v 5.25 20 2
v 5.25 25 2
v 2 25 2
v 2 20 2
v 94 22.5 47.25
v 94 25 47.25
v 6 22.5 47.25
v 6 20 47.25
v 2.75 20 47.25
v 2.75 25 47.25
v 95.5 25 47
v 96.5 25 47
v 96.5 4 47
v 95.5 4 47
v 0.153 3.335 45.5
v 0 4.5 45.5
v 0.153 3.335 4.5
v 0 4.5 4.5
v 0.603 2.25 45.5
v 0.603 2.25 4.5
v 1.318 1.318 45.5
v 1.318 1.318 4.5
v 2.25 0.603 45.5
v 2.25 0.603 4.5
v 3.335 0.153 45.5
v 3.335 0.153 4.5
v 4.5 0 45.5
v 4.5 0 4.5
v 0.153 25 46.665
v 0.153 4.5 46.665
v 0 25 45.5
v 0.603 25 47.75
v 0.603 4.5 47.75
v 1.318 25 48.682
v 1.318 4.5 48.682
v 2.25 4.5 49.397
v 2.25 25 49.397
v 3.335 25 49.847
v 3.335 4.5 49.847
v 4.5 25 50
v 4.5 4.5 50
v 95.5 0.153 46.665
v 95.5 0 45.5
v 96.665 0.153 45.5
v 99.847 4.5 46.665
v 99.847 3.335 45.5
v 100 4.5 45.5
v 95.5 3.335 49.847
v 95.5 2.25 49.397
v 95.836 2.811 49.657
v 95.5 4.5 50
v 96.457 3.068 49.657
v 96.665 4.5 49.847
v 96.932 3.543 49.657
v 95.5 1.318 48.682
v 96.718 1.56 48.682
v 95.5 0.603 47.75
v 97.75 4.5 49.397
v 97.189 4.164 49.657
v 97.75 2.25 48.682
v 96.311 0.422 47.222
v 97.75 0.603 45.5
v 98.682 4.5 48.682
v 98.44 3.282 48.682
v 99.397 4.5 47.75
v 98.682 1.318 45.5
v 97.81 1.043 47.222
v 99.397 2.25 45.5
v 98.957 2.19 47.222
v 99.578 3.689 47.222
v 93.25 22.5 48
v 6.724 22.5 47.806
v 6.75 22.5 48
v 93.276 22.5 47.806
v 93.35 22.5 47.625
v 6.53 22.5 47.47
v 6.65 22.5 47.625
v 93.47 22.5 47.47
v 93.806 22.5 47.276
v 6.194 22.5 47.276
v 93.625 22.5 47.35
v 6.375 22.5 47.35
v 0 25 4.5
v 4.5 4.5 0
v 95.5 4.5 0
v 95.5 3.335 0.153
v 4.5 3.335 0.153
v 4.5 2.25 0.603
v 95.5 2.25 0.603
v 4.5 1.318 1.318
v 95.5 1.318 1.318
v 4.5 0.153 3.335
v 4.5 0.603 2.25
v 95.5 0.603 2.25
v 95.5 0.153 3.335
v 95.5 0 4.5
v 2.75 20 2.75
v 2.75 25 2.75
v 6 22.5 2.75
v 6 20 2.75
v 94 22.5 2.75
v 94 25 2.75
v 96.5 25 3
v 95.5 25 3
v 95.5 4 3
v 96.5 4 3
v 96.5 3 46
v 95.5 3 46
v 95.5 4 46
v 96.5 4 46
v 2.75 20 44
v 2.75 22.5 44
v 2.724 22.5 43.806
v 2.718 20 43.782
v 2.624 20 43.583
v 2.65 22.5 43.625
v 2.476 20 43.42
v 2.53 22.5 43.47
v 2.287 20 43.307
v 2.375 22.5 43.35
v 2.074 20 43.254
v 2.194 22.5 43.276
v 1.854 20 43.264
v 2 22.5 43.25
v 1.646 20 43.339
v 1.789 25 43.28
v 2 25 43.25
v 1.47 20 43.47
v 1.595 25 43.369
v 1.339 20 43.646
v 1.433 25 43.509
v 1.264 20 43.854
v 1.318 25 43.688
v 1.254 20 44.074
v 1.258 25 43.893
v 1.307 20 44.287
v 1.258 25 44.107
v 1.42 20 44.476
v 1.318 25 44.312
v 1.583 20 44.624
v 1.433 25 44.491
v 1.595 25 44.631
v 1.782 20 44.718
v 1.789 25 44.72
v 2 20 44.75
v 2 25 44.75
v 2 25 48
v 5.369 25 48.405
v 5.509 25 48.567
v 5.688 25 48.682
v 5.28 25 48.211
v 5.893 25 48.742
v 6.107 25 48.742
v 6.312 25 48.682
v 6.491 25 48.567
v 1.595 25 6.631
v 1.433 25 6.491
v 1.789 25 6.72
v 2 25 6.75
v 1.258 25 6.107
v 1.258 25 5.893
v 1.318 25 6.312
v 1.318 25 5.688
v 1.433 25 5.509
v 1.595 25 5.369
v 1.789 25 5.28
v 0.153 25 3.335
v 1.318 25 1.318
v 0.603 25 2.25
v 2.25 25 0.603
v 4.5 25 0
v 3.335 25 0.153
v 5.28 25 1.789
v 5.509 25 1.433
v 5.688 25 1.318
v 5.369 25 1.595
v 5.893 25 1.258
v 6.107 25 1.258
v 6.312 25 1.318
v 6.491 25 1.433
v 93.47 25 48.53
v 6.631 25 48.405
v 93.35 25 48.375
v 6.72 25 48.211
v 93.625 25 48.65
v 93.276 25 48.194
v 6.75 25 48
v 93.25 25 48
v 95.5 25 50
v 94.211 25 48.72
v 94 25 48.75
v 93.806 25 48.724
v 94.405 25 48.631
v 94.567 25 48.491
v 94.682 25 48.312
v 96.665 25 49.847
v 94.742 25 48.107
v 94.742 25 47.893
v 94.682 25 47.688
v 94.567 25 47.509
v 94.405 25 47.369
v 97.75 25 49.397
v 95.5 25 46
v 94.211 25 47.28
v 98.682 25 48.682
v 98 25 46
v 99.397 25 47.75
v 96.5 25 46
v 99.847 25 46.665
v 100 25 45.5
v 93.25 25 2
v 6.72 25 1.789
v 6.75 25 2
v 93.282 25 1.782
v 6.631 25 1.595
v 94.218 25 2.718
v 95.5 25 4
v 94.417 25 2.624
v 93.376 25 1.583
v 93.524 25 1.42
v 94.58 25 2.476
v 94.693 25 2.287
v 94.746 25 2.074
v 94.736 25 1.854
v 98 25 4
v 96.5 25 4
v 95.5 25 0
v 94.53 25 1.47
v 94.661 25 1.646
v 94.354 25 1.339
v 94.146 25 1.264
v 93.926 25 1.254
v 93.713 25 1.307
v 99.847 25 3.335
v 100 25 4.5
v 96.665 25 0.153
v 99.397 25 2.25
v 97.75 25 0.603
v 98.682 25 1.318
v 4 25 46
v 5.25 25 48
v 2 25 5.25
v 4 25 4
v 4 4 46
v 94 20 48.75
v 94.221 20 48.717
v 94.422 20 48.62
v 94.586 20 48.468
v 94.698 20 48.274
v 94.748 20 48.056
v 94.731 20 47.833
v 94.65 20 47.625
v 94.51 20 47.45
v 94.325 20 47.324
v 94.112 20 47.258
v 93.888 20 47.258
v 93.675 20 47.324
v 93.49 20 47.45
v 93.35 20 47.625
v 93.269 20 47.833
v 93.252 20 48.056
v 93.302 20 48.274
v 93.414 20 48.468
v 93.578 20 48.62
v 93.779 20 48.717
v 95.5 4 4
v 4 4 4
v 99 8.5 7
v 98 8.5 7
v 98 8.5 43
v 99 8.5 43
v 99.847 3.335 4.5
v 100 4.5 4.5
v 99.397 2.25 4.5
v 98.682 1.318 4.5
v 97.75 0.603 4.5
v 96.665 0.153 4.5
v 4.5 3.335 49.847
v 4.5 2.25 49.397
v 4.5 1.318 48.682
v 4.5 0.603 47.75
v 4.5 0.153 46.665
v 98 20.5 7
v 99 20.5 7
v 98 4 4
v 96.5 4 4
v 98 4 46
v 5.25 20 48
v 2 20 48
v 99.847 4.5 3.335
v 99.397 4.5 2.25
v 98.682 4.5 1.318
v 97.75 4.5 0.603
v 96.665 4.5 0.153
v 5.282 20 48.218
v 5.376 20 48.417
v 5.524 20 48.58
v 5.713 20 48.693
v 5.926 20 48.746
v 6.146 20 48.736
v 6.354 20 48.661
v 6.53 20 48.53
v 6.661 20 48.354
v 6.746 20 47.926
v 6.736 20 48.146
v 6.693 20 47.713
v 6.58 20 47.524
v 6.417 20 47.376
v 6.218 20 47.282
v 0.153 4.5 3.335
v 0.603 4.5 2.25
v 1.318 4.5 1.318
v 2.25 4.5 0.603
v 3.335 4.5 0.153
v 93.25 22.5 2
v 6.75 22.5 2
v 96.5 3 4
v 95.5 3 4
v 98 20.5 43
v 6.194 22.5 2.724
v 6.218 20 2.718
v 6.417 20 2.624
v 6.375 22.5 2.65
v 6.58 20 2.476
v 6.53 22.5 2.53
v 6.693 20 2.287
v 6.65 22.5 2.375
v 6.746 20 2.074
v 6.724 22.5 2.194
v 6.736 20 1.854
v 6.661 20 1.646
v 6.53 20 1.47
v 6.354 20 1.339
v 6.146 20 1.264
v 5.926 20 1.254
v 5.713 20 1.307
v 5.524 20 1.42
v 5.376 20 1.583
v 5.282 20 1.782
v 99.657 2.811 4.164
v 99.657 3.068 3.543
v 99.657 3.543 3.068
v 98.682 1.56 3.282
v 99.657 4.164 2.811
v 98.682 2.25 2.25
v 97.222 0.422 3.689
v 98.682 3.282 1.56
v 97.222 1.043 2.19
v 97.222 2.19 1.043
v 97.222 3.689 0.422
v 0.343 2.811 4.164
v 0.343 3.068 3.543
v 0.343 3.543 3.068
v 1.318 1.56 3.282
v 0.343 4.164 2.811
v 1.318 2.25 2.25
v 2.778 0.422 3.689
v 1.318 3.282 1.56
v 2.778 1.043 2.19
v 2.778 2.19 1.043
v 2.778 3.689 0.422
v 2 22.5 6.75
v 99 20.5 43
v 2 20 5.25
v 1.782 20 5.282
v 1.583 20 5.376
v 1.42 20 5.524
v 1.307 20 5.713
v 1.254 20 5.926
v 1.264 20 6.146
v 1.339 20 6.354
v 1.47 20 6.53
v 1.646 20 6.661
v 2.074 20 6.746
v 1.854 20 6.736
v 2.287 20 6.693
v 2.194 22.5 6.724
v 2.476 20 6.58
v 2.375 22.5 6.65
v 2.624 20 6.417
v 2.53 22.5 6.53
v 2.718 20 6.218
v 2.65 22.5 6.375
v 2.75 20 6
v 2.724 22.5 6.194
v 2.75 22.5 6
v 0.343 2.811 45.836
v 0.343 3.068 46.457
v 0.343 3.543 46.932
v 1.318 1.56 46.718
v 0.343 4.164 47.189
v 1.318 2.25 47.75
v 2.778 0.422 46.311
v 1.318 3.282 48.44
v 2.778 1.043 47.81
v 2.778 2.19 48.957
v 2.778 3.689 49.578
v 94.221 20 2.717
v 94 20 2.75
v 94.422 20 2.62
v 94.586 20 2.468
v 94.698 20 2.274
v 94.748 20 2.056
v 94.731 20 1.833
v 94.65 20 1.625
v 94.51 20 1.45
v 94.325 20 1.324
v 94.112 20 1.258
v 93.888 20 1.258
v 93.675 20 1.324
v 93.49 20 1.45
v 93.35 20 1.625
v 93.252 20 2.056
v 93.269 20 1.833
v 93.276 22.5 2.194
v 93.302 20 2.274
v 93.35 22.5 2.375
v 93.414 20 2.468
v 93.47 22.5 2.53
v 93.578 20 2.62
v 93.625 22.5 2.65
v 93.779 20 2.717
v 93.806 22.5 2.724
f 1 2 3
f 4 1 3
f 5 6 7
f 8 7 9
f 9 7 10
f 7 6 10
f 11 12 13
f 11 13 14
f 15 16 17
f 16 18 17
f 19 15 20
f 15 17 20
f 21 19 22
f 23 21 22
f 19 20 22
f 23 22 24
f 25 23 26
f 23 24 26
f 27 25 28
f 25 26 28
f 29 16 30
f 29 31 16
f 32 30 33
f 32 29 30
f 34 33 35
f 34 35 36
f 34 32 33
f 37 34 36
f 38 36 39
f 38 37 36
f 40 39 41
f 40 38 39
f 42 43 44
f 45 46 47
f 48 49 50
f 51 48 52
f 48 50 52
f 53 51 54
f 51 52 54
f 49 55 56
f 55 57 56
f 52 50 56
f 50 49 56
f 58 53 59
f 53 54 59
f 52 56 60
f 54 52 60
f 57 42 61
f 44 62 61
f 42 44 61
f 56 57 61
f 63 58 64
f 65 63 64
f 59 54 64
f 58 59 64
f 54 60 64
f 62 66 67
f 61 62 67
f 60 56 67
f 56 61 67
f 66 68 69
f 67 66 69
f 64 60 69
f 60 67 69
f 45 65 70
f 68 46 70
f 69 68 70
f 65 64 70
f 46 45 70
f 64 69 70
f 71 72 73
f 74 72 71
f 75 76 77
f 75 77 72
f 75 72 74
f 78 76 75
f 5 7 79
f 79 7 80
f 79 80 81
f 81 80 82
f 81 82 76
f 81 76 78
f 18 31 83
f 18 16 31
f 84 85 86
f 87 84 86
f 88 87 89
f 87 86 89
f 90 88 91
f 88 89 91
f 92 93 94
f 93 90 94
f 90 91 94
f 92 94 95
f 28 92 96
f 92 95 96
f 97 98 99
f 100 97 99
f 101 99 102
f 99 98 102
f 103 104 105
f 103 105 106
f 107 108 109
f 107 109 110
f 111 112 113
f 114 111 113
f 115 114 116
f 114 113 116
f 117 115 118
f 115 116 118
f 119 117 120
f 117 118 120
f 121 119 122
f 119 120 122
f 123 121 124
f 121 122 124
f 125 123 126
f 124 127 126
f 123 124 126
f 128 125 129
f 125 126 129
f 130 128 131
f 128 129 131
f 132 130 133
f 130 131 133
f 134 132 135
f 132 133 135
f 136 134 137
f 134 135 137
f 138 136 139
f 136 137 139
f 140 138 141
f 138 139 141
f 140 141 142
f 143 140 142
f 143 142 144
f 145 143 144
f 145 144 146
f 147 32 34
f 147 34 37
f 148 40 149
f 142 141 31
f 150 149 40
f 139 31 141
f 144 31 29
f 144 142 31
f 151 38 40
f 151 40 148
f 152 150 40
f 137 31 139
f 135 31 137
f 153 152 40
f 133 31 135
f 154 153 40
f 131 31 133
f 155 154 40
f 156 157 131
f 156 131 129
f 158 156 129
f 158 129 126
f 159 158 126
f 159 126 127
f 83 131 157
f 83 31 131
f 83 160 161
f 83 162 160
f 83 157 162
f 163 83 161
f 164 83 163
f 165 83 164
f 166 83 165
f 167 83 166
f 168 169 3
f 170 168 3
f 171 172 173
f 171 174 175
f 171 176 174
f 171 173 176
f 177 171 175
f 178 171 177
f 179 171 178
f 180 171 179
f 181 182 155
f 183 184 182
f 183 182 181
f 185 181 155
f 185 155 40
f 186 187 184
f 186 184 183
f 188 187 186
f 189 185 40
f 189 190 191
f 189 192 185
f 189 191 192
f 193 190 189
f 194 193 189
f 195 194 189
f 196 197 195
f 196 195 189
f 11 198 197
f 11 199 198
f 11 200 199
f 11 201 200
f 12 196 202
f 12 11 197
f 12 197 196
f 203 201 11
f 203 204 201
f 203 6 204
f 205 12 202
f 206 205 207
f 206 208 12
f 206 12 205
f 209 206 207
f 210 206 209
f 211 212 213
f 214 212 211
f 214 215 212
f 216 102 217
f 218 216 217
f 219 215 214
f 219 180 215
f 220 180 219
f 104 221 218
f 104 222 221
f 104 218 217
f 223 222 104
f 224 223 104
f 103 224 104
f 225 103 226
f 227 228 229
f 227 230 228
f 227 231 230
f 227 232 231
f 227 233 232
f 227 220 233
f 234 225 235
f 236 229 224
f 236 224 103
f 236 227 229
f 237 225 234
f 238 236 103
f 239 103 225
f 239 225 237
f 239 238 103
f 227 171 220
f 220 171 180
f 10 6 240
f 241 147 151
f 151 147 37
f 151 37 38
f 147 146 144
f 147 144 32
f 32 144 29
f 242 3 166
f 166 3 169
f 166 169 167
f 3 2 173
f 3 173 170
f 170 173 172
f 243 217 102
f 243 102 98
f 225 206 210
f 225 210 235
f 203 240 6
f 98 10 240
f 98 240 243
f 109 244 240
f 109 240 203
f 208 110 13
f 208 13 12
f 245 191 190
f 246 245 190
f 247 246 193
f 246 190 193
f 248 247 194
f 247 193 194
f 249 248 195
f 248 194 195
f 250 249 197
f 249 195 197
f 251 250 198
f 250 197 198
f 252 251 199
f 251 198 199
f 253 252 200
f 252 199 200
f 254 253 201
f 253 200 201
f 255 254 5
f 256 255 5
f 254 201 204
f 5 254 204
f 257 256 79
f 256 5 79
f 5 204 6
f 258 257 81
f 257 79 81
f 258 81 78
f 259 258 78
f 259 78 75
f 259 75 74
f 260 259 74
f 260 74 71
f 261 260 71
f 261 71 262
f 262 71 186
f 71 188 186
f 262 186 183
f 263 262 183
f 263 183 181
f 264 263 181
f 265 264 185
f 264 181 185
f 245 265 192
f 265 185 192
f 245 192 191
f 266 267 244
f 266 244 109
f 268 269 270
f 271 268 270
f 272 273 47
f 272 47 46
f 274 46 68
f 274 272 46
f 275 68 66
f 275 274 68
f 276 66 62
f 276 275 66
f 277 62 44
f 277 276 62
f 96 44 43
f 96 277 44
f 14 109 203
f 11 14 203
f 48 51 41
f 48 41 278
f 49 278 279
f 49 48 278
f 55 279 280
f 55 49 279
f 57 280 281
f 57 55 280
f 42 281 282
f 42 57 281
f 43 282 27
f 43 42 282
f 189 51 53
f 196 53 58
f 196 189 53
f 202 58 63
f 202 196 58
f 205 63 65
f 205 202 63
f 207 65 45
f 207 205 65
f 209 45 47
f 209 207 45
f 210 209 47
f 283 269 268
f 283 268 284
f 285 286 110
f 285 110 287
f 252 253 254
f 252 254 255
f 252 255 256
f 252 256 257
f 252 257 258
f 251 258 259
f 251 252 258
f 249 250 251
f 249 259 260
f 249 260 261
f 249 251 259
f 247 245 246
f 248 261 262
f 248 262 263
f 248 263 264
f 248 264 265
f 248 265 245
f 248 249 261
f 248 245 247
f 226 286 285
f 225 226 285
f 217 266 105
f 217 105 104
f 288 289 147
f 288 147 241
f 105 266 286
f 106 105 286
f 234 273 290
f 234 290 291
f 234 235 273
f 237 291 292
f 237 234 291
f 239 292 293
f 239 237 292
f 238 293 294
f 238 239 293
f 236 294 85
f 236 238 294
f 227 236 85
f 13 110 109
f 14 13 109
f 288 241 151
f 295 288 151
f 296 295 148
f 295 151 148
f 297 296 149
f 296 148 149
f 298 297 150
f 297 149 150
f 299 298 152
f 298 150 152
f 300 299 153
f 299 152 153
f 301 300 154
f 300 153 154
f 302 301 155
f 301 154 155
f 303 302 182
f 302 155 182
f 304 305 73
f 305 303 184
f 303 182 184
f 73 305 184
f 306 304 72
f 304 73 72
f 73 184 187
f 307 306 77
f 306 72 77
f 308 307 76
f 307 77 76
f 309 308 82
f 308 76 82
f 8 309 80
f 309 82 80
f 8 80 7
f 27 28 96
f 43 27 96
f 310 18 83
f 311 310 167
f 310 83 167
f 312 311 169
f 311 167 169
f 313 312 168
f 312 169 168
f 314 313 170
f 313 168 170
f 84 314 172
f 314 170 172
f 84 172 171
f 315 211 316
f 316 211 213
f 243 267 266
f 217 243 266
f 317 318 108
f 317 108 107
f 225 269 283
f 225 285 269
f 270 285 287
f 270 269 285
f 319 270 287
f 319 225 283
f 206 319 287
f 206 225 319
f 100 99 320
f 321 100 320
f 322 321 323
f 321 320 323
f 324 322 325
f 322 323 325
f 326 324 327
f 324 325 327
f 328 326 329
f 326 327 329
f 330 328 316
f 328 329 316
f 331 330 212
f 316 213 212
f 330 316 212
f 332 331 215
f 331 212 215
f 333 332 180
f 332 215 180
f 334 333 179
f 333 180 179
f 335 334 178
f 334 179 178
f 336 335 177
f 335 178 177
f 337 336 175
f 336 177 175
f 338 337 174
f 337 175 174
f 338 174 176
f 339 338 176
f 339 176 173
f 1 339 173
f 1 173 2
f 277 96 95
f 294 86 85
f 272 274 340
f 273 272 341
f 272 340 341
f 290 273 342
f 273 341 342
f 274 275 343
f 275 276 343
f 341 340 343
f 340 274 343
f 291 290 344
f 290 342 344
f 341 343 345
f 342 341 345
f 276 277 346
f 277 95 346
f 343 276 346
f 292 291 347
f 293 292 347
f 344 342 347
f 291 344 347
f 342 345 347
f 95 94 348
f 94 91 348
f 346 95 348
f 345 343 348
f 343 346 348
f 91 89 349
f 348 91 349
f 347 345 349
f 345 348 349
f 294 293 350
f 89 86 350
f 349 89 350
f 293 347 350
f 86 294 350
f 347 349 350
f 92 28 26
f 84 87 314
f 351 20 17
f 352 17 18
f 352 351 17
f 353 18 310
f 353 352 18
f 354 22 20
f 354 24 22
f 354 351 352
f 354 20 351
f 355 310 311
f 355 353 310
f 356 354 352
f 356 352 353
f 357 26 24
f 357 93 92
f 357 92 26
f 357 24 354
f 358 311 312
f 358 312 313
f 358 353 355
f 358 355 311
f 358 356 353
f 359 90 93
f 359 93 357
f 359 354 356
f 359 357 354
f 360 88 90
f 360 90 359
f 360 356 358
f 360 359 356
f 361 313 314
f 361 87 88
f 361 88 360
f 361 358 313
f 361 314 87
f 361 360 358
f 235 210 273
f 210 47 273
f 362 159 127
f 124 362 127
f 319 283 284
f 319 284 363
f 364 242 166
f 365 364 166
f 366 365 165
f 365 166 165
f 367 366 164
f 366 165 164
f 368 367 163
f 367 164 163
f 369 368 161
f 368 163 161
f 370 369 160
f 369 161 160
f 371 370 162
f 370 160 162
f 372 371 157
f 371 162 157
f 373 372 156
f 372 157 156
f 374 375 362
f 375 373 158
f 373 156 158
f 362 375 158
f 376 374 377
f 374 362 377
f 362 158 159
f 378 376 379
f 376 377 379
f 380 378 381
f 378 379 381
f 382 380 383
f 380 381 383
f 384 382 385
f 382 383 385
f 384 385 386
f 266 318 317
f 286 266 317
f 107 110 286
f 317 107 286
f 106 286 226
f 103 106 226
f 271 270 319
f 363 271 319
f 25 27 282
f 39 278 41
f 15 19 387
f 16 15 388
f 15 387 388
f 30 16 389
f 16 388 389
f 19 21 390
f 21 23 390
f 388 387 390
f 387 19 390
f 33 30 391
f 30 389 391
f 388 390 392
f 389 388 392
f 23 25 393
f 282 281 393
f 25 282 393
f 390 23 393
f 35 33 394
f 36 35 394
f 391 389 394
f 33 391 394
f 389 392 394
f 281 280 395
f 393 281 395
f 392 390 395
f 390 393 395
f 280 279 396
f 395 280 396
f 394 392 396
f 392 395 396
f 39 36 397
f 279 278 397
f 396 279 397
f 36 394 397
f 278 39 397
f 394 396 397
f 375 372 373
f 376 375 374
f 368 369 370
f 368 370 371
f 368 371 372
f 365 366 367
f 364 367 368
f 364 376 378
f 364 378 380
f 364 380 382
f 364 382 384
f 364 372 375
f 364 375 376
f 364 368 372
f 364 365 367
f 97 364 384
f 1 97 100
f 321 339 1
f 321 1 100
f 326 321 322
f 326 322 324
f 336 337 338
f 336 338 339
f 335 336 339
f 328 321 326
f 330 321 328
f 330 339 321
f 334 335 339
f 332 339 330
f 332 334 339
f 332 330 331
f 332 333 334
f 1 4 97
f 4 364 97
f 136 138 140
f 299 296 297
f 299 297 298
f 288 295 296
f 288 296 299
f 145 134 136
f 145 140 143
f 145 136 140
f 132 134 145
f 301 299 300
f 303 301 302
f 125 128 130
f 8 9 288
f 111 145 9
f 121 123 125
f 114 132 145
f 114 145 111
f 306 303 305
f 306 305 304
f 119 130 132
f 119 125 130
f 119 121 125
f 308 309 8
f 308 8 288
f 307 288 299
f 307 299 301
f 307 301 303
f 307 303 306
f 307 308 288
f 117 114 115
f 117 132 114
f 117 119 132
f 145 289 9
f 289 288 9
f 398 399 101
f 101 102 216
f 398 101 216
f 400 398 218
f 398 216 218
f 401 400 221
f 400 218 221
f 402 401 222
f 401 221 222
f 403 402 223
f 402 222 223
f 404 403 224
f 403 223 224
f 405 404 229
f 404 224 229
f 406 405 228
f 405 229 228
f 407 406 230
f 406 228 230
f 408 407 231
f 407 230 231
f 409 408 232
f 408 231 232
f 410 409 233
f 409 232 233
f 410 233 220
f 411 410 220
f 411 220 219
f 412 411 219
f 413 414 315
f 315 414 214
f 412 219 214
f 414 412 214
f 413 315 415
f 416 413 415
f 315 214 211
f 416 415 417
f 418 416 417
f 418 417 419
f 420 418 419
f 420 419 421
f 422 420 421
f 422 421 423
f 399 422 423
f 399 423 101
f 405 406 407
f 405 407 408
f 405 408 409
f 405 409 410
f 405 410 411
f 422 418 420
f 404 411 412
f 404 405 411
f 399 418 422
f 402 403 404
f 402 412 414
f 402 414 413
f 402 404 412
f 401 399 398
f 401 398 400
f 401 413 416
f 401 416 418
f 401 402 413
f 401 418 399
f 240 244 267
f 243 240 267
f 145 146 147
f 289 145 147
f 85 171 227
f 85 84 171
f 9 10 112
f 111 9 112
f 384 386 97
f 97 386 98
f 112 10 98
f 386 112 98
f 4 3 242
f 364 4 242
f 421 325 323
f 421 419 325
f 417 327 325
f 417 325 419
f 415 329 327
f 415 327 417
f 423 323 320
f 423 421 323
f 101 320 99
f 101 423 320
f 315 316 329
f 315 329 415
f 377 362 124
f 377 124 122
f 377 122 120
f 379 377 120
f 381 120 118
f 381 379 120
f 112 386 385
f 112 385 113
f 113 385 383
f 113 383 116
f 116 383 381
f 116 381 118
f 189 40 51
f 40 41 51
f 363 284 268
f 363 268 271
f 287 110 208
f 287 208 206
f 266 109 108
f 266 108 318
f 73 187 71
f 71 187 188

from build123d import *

# Parameters (mm, degrees)
SKETCH_1_W           = 100
SKETCH_1_H           = 50
EXTRUDE_1_DEPTH      = 25
SHELL_1_T            = -4
FILLET_1_R           = 4.5
SKETCH_2_R           = 0.75
CUT_EXTRUDE_1_DEPTH  = 5
CUT_EXTRUDE_3_DEPTH  = 2.5
SKETCH_8_W           = 36
SKETCH_8_H           = 12
CUT_EXTRUDE_4_DEPTH  = 3
SKETCH_9_W           = 42
SKETCH_9_H           = 21
CUT_EXTRUDE_7_DEPTH  = 2
SKETCH_7_W           = 1
SKETCH_7_H           = 42
CUT_EXTRUDE_8_DEPTH  = 1
SKETCH_11_W          = 1
SKETCH_11_H          = 21
CUT_EXTRUDE_10_DEPTH = 1
SKETCH_12_W          = 1
SKETCH_12_H          = 21
CUT_EXTRUDE_11_DEPTH = 1


with BuildPart() as part:
    # Эскиз1 → Бобышка-Вытянуть1 (new body)
    with BuildSketch(Plane(origin=(0, 0, 0), x_dir=(1, 0, 0), z_dir=(0, 1, 0))):
        with Locations((50, -25)):
            Rectangle(SKETCH_1_W, SKETCH_1_H)
    extrude(amount=EXTRUDE_1_DEPTH)

    # Оболочка1
    shell_1_openings = [part.faces().sort_by_distance(p)[0] for p in [
        (50, 25, 25),
    ]]
    offset(amount=SHELL_1_T, openings=shell_1_openings, kind=Kind.INTERSECTION)

    # Скругление1
    fillet_1_edges = [part.edges().sort_by_distance(p)[0] for p in [
        (50, 0, 50),
        (100, 0, 25),
        (50, 0, 0),
        (0, 0, 25),
        (100, 12.5, 0),
        (100, 12.5, 50),
        (0, 12.5, 0),
        (0, 12.5, 50),
    ]]
    fillet(fillet_1_edges, radius=FILLET_1_R)

    # Эскиз2 → Вырез-Вытянуть1 (cut)
    with BuildSketch(Plane(origin=(0, 25, 0), x_dir=(1, 0, 0), z_dir=(0, 1, 0))):
        with BuildLine():
            Line((2, -2), (2, -5.25))
            ThreePointArc((2, -5.25), (1.469669914, -6.530330086), (2.75, -6))
            Line((2.75, -6), (2.75, -2.75))
            Line((2.75, -2.75), (6, -2.75))
            ThreePointArc((6, -2.75), (6.530330086, -1.469669914), (5.25, -2))
            Line((5.25, -2), (2, -2))
        make_face()
        with BuildLine():
            Line((2, -44.75), (2, -48))
            Line((2, -48), (5.25, -48))
            ThreePointArc((5.25, -48), (6.530330086, -48.530330086), (6, -47.25))
            Line((6, -47.25), (2.75, -47.25))
            Line((2.75, -47.25), (2.75, -44))
            ThreePointArc((2.75, -44), (1.469669914, -43.469669914), (2, -44.75))
        make_face()
        with Locations((94, -2)):
            Circle(SKETCH_2_R)
        with Locations((94, -48)):
            Circle(SKETCH_2_R)
    extrude(amount=-CUT_EXTRUDE_1_DEPTH, mode=Mode.SUBTRACT)

    # Эскиз2<6> → Вырез-Вытянуть3 (cut)
    with BuildSketch(Plane(origin=(0, 25, 0), x_dir=(1, 0, 0), z_dir=(0, 1, 0))):
        with BuildLine():
            Line((2.75, -44), (2.75, -6))
            ThreePointArc((2.75, -6), (2.530330086, -6.530330086), (2, -6.75))
            Line((2, -6.75), (2, -43.25))
            ThreePointArc((2, -43.25), (2.530330086, -43.469669914), (2.75, -44))
        make_face()
        with BuildLine():
            ThreePointArc((6.75, -2), (6.530330086, -2.530330086), (6, -2.75))
            Line((6, -2.75), (94, -2.75))
            ThreePointArc((94, -2.75), (93.469669914, -2.530330086), (93.25, -2))
            Line((93.25, -2), (6.75, -2))
        make_face()
        with BuildLine():
            Line((94, -47.25), (6, -47.25))
            ThreePointArc((6, -47.25), (6.530330086, -47.469669914), (6.75, -48))
            Line((6.75, -48), (93.25, -48))
            ThreePointArc((93.25, -48), (93.469669914, -47.469669914), (94, -47.25))
        make_face()
    extrude(amount=-CUT_EXTRUDE_3_DEPTH, mode=Mode.SUBTRACT)

    # Эскиз8 → Вырез-Вытянуть4 (cut)
    with BuildSketch(Plane.ZY.offset(-96)):
        with Locations((25, 14.5)):
            Rectangle(SKETCH_8_W, SKETCH_8_H)
    extrude(amount=-CUT_EXTRUDE_4_DEPTH, mode=Mode.SUBTRACT)

    # Эскиз9 → Вырез-Вытянуть7 (cut)
    with BuildSketch(Plane.ZY.offset(-96)):
        with Locations((25, 14.5)):
            Rectangle(SKETCH_9_W, SKETCH_9_H)
    extrude(amount=-CUT_EXTRUDE_7_DEPTH, mode=Mode.SUBTRACT)

    # Эскиз7 → Вырез-Вытянуть8 (cut)
    with BuildSketch(Plane(origin=(0, 4, 0), x_dir=(1, 0, 0), z_dir=(0, 1, 0))):
        with Locations((96, -25)):
            Rectangle(SKETCH_7_W, SKETCH_7_H)
    extrude(amount=-CUT_EXTRUDE_8_DEPTH, mode=Mode.SUBTRACT)

    # Эскиз11 → Вырез-Вытянуть10 (cut)
    with BuildSketch(Plane.XY.offset(4)):
        with Locations((96, 14.5)):
            Rectangle(SKETCH_11_W, SKETCH_11_H)
    extrude(amount=-CUT_EXTRUDE_10_DEPTH, mode=Mode.SUBTRACT)

    # Эскиз12 → Вырез-Вытянуть11 (cut)
    with BuildSketch(Plane(origin=(0, 0, 46), x_dir=(-1, 0, 0), z_dir=(0, 0, -1))):
        with Locations((-96, 14.5)):
            Rectangle(SKETCH_12_W, SKETCH_12_H)
    extrude(amount=-CUT_EXTRUDE_11_DEPTH, mode=Mode.SUBTRACT)


solid = part.part
